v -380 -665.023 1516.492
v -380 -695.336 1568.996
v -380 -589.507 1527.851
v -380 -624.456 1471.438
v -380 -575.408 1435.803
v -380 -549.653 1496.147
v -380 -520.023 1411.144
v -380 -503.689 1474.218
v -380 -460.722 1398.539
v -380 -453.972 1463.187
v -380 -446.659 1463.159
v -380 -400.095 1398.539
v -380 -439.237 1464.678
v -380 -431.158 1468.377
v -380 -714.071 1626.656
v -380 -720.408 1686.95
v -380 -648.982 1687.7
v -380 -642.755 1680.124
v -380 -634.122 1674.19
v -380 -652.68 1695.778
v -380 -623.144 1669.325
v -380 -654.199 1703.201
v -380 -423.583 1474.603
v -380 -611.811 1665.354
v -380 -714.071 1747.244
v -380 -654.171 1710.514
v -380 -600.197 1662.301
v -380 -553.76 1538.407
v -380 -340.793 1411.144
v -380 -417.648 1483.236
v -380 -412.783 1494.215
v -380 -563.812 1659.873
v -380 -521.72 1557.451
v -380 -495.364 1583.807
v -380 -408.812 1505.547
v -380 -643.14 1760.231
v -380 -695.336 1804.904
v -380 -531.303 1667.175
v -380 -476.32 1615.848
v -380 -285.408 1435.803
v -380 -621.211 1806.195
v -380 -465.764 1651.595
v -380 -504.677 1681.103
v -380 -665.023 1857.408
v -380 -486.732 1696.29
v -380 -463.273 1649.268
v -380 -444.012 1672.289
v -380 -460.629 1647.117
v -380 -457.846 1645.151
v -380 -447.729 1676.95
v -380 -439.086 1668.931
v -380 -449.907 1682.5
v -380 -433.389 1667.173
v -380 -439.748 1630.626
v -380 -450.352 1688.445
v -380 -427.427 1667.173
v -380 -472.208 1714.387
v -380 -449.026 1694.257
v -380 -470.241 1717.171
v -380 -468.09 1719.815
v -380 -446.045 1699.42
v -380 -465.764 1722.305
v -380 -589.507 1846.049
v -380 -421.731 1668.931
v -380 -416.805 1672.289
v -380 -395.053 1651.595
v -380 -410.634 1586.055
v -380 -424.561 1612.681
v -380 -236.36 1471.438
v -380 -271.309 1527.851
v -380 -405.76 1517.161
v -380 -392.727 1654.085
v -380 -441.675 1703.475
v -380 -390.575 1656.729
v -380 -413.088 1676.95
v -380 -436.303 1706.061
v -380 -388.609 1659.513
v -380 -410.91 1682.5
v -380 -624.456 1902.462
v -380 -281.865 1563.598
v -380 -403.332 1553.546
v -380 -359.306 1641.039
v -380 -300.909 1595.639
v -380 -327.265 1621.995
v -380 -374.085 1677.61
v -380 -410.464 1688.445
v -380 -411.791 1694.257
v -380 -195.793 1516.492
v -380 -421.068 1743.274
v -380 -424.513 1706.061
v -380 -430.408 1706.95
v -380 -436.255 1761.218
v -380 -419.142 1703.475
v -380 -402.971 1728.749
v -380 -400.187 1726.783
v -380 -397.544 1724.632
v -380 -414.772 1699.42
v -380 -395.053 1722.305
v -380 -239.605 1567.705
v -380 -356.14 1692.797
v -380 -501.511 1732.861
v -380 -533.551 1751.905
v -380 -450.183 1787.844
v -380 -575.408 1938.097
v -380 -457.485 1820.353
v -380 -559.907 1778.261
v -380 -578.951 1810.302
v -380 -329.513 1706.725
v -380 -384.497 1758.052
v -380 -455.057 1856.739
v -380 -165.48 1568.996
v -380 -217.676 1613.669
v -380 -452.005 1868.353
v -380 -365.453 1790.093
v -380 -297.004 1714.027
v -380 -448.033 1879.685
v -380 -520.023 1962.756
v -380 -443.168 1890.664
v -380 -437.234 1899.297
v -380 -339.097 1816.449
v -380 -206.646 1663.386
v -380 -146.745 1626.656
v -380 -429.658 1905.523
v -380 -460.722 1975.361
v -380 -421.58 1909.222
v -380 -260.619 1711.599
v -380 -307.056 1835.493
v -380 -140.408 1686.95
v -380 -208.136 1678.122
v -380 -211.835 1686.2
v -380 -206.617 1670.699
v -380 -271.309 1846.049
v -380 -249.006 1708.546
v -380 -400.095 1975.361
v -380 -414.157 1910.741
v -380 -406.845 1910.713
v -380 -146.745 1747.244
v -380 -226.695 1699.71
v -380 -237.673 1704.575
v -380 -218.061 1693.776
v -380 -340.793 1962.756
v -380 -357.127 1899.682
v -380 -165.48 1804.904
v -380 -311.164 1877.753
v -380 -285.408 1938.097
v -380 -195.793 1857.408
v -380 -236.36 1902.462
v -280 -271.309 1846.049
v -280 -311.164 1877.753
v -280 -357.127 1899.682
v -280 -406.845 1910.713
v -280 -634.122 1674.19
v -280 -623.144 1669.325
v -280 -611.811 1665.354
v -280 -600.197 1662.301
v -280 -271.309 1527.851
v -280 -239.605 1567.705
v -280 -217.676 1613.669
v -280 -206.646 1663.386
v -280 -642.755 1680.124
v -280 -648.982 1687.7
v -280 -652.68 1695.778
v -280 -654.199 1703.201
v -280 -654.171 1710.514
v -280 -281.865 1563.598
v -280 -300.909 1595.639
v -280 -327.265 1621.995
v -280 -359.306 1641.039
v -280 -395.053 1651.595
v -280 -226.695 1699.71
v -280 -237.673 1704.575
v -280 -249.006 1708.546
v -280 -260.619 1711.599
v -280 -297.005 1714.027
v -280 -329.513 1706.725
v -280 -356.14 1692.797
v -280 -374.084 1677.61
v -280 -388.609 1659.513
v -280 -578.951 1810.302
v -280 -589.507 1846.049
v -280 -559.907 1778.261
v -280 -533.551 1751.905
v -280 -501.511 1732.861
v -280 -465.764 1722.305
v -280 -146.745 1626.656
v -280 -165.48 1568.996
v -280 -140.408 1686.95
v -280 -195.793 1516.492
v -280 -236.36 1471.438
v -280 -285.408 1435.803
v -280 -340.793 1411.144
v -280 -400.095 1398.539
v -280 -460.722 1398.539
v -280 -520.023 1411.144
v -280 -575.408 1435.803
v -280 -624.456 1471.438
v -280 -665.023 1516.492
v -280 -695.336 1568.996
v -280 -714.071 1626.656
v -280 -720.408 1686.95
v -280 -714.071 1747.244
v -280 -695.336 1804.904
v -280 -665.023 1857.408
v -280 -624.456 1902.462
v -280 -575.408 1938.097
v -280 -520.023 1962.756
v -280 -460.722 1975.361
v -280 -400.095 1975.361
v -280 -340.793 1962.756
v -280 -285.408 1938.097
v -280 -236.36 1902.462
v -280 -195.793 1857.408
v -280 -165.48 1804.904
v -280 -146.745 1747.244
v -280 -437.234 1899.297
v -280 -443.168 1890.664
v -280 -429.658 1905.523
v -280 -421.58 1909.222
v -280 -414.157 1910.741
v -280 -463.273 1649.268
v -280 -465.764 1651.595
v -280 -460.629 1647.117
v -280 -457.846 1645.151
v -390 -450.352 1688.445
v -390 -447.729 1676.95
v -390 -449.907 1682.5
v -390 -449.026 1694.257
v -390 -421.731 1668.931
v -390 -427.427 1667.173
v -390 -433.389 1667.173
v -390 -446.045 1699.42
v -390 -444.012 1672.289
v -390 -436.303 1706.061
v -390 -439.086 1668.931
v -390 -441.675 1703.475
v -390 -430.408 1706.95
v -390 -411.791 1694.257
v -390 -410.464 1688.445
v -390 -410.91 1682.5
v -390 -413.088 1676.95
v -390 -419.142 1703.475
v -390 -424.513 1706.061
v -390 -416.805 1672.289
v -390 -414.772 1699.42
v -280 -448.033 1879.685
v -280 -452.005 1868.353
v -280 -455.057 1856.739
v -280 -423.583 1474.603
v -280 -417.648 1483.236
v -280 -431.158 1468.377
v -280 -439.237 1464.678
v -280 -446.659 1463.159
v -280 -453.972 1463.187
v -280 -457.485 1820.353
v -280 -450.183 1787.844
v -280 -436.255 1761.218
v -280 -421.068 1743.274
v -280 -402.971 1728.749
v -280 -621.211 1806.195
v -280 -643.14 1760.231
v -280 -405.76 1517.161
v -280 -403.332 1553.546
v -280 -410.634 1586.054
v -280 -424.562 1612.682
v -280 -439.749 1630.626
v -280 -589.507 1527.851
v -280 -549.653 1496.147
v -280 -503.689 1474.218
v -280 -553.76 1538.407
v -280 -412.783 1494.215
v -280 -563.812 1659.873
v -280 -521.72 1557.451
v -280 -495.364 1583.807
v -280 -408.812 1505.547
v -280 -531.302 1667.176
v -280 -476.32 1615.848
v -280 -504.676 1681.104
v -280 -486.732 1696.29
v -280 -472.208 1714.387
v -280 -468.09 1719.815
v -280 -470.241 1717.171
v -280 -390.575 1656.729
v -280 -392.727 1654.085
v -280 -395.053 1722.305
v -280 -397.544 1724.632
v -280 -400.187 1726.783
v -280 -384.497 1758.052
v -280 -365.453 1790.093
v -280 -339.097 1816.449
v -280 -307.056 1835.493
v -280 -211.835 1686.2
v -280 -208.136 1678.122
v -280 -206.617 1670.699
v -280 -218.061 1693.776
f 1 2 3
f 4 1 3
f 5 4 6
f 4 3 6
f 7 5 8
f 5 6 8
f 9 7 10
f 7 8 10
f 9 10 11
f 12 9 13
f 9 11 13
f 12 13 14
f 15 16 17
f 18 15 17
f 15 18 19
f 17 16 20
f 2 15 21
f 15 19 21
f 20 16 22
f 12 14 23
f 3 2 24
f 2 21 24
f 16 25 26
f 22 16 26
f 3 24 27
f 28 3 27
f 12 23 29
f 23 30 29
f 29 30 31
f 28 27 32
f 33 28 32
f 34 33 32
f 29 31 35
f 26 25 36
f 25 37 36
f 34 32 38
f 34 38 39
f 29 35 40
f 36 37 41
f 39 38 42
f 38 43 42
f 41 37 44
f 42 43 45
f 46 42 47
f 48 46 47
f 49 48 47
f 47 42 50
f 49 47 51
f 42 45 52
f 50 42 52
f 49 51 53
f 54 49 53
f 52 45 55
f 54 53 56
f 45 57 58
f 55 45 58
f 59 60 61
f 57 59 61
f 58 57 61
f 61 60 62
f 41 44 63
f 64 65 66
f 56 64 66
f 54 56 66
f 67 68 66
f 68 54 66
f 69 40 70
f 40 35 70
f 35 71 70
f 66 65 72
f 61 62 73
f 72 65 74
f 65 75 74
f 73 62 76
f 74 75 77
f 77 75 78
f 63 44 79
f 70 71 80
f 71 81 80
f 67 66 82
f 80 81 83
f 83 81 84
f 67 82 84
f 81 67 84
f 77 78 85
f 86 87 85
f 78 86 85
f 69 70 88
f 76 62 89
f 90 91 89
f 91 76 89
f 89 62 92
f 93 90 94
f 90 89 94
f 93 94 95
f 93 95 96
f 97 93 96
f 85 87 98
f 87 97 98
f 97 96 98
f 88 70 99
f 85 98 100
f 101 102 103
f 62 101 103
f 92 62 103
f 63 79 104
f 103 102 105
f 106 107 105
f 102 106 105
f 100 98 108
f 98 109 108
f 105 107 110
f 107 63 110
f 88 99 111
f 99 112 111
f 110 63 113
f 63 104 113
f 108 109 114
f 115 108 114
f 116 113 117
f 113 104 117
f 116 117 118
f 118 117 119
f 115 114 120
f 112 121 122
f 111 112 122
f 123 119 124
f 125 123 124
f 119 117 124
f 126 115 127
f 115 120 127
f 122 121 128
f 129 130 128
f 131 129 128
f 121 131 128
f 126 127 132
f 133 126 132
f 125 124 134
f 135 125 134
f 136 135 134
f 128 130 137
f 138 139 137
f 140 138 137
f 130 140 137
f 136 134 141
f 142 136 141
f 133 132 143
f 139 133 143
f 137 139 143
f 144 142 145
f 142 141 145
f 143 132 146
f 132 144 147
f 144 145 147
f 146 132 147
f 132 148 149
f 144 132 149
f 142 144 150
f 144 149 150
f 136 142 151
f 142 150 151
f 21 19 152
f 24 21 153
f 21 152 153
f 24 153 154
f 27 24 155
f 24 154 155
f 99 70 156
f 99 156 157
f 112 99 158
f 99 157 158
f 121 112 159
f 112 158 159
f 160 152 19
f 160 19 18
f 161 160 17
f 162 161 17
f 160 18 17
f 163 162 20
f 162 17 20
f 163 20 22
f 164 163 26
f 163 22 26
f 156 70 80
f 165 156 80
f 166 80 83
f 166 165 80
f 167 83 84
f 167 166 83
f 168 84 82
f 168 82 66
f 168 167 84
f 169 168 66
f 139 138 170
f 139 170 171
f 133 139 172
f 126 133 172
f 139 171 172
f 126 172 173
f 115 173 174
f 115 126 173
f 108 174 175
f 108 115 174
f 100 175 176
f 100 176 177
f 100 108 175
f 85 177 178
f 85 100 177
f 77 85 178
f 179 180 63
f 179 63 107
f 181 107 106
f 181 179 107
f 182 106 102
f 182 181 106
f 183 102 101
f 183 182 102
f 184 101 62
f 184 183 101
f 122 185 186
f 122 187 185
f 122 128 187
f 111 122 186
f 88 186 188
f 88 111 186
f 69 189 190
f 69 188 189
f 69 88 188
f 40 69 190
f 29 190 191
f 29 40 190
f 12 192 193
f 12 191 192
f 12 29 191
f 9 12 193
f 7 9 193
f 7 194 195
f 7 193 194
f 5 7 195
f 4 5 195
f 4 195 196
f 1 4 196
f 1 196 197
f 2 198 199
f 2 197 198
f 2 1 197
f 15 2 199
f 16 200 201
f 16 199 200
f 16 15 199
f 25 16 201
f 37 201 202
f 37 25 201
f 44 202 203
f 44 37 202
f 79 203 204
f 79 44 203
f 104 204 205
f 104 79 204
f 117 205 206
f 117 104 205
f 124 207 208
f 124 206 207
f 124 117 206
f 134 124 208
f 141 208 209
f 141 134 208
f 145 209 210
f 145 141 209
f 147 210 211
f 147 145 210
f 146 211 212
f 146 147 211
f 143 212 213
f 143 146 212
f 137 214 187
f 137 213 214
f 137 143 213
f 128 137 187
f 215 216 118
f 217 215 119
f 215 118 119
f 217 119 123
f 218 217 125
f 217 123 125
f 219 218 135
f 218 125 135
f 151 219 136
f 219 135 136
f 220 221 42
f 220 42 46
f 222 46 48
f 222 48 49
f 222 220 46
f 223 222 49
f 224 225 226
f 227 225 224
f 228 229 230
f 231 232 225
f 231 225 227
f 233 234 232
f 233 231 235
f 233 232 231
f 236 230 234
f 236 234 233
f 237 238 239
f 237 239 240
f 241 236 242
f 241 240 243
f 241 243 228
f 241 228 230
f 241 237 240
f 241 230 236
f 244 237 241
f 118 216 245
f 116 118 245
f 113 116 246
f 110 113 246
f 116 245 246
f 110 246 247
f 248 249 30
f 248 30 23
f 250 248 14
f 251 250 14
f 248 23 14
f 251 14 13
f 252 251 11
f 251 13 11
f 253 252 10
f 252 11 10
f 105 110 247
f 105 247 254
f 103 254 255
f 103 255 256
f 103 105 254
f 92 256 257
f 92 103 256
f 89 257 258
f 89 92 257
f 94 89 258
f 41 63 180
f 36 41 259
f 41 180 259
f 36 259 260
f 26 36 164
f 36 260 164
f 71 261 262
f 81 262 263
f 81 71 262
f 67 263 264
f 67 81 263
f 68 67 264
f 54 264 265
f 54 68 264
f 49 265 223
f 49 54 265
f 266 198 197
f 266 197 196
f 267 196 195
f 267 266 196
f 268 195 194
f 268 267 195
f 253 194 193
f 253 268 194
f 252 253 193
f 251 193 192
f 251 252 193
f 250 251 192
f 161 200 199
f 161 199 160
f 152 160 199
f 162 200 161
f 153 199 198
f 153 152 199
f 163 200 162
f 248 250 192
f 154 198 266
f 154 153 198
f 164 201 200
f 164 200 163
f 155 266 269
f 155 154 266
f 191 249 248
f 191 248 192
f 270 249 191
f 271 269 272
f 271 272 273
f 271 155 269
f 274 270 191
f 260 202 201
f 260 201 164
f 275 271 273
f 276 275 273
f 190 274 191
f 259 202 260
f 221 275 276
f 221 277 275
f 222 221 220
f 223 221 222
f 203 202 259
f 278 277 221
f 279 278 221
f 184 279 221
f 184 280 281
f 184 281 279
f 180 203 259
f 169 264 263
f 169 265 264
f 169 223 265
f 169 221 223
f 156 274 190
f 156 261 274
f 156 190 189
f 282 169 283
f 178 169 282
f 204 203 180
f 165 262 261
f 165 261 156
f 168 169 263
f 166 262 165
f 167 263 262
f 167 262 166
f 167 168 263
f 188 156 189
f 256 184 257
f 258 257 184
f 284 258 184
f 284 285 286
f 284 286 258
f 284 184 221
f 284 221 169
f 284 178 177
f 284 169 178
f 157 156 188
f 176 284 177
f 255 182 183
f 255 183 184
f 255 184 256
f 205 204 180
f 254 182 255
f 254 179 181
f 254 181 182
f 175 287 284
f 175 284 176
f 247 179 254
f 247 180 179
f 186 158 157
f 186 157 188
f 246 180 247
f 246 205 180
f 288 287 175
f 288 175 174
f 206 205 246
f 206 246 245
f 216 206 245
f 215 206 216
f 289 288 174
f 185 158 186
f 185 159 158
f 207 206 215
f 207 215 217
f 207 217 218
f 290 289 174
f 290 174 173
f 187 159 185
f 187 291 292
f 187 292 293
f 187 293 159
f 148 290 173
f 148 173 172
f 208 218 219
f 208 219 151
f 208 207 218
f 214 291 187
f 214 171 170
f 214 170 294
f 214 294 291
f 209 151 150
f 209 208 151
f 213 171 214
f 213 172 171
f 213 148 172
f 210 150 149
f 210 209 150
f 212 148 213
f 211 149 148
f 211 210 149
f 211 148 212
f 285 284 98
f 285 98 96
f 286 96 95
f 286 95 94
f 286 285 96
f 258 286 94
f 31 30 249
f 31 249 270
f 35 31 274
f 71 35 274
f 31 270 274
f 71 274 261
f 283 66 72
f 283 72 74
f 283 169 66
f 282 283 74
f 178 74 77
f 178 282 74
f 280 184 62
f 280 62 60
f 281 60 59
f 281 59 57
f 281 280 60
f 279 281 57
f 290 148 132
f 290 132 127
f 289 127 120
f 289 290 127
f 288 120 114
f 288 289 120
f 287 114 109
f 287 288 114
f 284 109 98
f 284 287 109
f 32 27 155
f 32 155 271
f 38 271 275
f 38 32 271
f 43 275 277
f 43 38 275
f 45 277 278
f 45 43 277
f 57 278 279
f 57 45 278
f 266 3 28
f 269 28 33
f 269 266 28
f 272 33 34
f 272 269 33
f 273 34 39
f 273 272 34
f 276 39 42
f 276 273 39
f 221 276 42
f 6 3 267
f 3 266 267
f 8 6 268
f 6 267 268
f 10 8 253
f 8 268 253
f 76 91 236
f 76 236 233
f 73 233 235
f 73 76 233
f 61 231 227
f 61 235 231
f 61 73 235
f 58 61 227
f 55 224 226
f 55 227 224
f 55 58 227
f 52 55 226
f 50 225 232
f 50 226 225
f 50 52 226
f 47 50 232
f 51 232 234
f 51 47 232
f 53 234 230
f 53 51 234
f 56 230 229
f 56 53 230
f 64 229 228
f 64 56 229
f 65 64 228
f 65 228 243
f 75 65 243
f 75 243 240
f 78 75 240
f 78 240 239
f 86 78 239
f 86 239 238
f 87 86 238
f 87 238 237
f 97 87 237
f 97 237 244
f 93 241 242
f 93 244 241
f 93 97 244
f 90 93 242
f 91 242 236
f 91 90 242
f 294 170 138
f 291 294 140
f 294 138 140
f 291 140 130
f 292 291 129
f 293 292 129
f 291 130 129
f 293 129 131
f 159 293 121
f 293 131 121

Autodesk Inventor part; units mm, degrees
ref_plane "YZ Plane" through (0, 0, 0) normal (1, 0, 0) x (0, 1, 0)
ref_plane "XZ Plane" through (0, 0, 0) normal (0, 1, 0) x (-1, 0, 0)
ref_plane "XY Plane" through (0, 0, 0) normal (0, 0, 1) x (1, 0, 0)
ref_plane "작업 평면1" through (-380, -430.4083, 1686.95) normal (1, 0, 0) x (0, 1, 0)
sketch "스케치1" plane through (-380, -430.4083, 1686.95) normal (1, 0, 0) x (0, 1, 0)
  circle A0 centre (0, 0) radius 290
  point P0 (430.4083, -1686.95)
  dimension "d0" = 580
extrude "돌출1" add sketch "스케치1" along normal blind 100
sketch "스케치2" plane through (-380, -430.4083, 1686.95) normal (-1, 0, 0) x (0, 0, 1)
  circle A0 centre (0, 0) radius 20
  point P0 (-1686.95, 430.4083)
  dimension "d3" = 40
extrude "돌출2" add sketch "스케치2" along normal blind 10
sketch "스케치3" plane through (-280, -430.4083, 1686.95) normal (1, 0, 0) x (0, 0, -1)
  circle A0 centre (0, 0) radius 225
  circle A1 centre (0, 0) radius 20 projected
  circle A2 centre (0, 0) radius 50
  arc A3 (225, 0) -> (50, 0) centre (137.5, -121.8349) ccw
  arc A4 (0, -225) -> (0, -50) centre (-121.8349, -137.5) ccw
  line L0 (0, 0) -> (159.099, -159.099)
  line L1 (0, 0) -> (225, 0) construction
  line L2 (159.099, -159.099) -> (-159.099, 159.099)
  line L3 (0, 0) -> (159.099, 159.099)
  line L4 (0, 0) -> (225, 0) construction
  line L5 (159.099, 159.099) -> (-159.099, -159.099)
  arc A5 (-159.099, -159.099) -> (-35.3553, -35.3553) centre (-183.3775, -11.0769) ccw
  arc A6 (159.099, 159.099) -> (35.3553, 35.3553) centre (183.3775, 11.0769) ccw
  arc A7 (159.099, -159.099) -> (35.3553, -35.3553) centre (11.0769, -183.3775) ccw
  arc A8 (-225, 0) -> (-50, 0) centre (-137.5, 121.8349) ccw
  arc A9 (-159.099, 159.099) -> (-35.3553, 35.3553) centre (-11.0769, 183.3775) ccw
  arc A10 (0, 225) -> (0, 50) centre (121.8349, 137.5) ccw
  point P0 (1686.95, 430.4083)
  dimension "d6" = 450
  dimension "d7" = 100
  dimension "d10" = 150
  dimension "d11" = 150
  dimension "d12" = 45
  dimension "d13" = 45
  dimension "d14" = 150
  dimension "d16" = 150
  dimension "d17" = 150
  dimension "d18" = 150
  dimension "d19" = 150
  dimension "d20" = 150
extrude "돌출3" cut sketch "스케치3" against normal blind 100 contours A0 A7 A2 A3 | A6 A2 A10 A0 | A0 A5 A2 A4 | A9 A2 A8 A0
fillet "모깎기1" radius 121.75 4 edges at (-330, -380.4083, 1686.95) (-330, -430.4083, 1736.95) (-330, -480.4083, 1686.95) (-330, -430.4083, 1636.95)
fillet "모깎기2" radius 36.25 4 edges at (-330, -205.4083, 1686.95) (-330, -430.4083, 1911.95) (-330, -430.4083, 1461.95) (-330, -655.4083, 1686.95)
properties part number "바퀴"
